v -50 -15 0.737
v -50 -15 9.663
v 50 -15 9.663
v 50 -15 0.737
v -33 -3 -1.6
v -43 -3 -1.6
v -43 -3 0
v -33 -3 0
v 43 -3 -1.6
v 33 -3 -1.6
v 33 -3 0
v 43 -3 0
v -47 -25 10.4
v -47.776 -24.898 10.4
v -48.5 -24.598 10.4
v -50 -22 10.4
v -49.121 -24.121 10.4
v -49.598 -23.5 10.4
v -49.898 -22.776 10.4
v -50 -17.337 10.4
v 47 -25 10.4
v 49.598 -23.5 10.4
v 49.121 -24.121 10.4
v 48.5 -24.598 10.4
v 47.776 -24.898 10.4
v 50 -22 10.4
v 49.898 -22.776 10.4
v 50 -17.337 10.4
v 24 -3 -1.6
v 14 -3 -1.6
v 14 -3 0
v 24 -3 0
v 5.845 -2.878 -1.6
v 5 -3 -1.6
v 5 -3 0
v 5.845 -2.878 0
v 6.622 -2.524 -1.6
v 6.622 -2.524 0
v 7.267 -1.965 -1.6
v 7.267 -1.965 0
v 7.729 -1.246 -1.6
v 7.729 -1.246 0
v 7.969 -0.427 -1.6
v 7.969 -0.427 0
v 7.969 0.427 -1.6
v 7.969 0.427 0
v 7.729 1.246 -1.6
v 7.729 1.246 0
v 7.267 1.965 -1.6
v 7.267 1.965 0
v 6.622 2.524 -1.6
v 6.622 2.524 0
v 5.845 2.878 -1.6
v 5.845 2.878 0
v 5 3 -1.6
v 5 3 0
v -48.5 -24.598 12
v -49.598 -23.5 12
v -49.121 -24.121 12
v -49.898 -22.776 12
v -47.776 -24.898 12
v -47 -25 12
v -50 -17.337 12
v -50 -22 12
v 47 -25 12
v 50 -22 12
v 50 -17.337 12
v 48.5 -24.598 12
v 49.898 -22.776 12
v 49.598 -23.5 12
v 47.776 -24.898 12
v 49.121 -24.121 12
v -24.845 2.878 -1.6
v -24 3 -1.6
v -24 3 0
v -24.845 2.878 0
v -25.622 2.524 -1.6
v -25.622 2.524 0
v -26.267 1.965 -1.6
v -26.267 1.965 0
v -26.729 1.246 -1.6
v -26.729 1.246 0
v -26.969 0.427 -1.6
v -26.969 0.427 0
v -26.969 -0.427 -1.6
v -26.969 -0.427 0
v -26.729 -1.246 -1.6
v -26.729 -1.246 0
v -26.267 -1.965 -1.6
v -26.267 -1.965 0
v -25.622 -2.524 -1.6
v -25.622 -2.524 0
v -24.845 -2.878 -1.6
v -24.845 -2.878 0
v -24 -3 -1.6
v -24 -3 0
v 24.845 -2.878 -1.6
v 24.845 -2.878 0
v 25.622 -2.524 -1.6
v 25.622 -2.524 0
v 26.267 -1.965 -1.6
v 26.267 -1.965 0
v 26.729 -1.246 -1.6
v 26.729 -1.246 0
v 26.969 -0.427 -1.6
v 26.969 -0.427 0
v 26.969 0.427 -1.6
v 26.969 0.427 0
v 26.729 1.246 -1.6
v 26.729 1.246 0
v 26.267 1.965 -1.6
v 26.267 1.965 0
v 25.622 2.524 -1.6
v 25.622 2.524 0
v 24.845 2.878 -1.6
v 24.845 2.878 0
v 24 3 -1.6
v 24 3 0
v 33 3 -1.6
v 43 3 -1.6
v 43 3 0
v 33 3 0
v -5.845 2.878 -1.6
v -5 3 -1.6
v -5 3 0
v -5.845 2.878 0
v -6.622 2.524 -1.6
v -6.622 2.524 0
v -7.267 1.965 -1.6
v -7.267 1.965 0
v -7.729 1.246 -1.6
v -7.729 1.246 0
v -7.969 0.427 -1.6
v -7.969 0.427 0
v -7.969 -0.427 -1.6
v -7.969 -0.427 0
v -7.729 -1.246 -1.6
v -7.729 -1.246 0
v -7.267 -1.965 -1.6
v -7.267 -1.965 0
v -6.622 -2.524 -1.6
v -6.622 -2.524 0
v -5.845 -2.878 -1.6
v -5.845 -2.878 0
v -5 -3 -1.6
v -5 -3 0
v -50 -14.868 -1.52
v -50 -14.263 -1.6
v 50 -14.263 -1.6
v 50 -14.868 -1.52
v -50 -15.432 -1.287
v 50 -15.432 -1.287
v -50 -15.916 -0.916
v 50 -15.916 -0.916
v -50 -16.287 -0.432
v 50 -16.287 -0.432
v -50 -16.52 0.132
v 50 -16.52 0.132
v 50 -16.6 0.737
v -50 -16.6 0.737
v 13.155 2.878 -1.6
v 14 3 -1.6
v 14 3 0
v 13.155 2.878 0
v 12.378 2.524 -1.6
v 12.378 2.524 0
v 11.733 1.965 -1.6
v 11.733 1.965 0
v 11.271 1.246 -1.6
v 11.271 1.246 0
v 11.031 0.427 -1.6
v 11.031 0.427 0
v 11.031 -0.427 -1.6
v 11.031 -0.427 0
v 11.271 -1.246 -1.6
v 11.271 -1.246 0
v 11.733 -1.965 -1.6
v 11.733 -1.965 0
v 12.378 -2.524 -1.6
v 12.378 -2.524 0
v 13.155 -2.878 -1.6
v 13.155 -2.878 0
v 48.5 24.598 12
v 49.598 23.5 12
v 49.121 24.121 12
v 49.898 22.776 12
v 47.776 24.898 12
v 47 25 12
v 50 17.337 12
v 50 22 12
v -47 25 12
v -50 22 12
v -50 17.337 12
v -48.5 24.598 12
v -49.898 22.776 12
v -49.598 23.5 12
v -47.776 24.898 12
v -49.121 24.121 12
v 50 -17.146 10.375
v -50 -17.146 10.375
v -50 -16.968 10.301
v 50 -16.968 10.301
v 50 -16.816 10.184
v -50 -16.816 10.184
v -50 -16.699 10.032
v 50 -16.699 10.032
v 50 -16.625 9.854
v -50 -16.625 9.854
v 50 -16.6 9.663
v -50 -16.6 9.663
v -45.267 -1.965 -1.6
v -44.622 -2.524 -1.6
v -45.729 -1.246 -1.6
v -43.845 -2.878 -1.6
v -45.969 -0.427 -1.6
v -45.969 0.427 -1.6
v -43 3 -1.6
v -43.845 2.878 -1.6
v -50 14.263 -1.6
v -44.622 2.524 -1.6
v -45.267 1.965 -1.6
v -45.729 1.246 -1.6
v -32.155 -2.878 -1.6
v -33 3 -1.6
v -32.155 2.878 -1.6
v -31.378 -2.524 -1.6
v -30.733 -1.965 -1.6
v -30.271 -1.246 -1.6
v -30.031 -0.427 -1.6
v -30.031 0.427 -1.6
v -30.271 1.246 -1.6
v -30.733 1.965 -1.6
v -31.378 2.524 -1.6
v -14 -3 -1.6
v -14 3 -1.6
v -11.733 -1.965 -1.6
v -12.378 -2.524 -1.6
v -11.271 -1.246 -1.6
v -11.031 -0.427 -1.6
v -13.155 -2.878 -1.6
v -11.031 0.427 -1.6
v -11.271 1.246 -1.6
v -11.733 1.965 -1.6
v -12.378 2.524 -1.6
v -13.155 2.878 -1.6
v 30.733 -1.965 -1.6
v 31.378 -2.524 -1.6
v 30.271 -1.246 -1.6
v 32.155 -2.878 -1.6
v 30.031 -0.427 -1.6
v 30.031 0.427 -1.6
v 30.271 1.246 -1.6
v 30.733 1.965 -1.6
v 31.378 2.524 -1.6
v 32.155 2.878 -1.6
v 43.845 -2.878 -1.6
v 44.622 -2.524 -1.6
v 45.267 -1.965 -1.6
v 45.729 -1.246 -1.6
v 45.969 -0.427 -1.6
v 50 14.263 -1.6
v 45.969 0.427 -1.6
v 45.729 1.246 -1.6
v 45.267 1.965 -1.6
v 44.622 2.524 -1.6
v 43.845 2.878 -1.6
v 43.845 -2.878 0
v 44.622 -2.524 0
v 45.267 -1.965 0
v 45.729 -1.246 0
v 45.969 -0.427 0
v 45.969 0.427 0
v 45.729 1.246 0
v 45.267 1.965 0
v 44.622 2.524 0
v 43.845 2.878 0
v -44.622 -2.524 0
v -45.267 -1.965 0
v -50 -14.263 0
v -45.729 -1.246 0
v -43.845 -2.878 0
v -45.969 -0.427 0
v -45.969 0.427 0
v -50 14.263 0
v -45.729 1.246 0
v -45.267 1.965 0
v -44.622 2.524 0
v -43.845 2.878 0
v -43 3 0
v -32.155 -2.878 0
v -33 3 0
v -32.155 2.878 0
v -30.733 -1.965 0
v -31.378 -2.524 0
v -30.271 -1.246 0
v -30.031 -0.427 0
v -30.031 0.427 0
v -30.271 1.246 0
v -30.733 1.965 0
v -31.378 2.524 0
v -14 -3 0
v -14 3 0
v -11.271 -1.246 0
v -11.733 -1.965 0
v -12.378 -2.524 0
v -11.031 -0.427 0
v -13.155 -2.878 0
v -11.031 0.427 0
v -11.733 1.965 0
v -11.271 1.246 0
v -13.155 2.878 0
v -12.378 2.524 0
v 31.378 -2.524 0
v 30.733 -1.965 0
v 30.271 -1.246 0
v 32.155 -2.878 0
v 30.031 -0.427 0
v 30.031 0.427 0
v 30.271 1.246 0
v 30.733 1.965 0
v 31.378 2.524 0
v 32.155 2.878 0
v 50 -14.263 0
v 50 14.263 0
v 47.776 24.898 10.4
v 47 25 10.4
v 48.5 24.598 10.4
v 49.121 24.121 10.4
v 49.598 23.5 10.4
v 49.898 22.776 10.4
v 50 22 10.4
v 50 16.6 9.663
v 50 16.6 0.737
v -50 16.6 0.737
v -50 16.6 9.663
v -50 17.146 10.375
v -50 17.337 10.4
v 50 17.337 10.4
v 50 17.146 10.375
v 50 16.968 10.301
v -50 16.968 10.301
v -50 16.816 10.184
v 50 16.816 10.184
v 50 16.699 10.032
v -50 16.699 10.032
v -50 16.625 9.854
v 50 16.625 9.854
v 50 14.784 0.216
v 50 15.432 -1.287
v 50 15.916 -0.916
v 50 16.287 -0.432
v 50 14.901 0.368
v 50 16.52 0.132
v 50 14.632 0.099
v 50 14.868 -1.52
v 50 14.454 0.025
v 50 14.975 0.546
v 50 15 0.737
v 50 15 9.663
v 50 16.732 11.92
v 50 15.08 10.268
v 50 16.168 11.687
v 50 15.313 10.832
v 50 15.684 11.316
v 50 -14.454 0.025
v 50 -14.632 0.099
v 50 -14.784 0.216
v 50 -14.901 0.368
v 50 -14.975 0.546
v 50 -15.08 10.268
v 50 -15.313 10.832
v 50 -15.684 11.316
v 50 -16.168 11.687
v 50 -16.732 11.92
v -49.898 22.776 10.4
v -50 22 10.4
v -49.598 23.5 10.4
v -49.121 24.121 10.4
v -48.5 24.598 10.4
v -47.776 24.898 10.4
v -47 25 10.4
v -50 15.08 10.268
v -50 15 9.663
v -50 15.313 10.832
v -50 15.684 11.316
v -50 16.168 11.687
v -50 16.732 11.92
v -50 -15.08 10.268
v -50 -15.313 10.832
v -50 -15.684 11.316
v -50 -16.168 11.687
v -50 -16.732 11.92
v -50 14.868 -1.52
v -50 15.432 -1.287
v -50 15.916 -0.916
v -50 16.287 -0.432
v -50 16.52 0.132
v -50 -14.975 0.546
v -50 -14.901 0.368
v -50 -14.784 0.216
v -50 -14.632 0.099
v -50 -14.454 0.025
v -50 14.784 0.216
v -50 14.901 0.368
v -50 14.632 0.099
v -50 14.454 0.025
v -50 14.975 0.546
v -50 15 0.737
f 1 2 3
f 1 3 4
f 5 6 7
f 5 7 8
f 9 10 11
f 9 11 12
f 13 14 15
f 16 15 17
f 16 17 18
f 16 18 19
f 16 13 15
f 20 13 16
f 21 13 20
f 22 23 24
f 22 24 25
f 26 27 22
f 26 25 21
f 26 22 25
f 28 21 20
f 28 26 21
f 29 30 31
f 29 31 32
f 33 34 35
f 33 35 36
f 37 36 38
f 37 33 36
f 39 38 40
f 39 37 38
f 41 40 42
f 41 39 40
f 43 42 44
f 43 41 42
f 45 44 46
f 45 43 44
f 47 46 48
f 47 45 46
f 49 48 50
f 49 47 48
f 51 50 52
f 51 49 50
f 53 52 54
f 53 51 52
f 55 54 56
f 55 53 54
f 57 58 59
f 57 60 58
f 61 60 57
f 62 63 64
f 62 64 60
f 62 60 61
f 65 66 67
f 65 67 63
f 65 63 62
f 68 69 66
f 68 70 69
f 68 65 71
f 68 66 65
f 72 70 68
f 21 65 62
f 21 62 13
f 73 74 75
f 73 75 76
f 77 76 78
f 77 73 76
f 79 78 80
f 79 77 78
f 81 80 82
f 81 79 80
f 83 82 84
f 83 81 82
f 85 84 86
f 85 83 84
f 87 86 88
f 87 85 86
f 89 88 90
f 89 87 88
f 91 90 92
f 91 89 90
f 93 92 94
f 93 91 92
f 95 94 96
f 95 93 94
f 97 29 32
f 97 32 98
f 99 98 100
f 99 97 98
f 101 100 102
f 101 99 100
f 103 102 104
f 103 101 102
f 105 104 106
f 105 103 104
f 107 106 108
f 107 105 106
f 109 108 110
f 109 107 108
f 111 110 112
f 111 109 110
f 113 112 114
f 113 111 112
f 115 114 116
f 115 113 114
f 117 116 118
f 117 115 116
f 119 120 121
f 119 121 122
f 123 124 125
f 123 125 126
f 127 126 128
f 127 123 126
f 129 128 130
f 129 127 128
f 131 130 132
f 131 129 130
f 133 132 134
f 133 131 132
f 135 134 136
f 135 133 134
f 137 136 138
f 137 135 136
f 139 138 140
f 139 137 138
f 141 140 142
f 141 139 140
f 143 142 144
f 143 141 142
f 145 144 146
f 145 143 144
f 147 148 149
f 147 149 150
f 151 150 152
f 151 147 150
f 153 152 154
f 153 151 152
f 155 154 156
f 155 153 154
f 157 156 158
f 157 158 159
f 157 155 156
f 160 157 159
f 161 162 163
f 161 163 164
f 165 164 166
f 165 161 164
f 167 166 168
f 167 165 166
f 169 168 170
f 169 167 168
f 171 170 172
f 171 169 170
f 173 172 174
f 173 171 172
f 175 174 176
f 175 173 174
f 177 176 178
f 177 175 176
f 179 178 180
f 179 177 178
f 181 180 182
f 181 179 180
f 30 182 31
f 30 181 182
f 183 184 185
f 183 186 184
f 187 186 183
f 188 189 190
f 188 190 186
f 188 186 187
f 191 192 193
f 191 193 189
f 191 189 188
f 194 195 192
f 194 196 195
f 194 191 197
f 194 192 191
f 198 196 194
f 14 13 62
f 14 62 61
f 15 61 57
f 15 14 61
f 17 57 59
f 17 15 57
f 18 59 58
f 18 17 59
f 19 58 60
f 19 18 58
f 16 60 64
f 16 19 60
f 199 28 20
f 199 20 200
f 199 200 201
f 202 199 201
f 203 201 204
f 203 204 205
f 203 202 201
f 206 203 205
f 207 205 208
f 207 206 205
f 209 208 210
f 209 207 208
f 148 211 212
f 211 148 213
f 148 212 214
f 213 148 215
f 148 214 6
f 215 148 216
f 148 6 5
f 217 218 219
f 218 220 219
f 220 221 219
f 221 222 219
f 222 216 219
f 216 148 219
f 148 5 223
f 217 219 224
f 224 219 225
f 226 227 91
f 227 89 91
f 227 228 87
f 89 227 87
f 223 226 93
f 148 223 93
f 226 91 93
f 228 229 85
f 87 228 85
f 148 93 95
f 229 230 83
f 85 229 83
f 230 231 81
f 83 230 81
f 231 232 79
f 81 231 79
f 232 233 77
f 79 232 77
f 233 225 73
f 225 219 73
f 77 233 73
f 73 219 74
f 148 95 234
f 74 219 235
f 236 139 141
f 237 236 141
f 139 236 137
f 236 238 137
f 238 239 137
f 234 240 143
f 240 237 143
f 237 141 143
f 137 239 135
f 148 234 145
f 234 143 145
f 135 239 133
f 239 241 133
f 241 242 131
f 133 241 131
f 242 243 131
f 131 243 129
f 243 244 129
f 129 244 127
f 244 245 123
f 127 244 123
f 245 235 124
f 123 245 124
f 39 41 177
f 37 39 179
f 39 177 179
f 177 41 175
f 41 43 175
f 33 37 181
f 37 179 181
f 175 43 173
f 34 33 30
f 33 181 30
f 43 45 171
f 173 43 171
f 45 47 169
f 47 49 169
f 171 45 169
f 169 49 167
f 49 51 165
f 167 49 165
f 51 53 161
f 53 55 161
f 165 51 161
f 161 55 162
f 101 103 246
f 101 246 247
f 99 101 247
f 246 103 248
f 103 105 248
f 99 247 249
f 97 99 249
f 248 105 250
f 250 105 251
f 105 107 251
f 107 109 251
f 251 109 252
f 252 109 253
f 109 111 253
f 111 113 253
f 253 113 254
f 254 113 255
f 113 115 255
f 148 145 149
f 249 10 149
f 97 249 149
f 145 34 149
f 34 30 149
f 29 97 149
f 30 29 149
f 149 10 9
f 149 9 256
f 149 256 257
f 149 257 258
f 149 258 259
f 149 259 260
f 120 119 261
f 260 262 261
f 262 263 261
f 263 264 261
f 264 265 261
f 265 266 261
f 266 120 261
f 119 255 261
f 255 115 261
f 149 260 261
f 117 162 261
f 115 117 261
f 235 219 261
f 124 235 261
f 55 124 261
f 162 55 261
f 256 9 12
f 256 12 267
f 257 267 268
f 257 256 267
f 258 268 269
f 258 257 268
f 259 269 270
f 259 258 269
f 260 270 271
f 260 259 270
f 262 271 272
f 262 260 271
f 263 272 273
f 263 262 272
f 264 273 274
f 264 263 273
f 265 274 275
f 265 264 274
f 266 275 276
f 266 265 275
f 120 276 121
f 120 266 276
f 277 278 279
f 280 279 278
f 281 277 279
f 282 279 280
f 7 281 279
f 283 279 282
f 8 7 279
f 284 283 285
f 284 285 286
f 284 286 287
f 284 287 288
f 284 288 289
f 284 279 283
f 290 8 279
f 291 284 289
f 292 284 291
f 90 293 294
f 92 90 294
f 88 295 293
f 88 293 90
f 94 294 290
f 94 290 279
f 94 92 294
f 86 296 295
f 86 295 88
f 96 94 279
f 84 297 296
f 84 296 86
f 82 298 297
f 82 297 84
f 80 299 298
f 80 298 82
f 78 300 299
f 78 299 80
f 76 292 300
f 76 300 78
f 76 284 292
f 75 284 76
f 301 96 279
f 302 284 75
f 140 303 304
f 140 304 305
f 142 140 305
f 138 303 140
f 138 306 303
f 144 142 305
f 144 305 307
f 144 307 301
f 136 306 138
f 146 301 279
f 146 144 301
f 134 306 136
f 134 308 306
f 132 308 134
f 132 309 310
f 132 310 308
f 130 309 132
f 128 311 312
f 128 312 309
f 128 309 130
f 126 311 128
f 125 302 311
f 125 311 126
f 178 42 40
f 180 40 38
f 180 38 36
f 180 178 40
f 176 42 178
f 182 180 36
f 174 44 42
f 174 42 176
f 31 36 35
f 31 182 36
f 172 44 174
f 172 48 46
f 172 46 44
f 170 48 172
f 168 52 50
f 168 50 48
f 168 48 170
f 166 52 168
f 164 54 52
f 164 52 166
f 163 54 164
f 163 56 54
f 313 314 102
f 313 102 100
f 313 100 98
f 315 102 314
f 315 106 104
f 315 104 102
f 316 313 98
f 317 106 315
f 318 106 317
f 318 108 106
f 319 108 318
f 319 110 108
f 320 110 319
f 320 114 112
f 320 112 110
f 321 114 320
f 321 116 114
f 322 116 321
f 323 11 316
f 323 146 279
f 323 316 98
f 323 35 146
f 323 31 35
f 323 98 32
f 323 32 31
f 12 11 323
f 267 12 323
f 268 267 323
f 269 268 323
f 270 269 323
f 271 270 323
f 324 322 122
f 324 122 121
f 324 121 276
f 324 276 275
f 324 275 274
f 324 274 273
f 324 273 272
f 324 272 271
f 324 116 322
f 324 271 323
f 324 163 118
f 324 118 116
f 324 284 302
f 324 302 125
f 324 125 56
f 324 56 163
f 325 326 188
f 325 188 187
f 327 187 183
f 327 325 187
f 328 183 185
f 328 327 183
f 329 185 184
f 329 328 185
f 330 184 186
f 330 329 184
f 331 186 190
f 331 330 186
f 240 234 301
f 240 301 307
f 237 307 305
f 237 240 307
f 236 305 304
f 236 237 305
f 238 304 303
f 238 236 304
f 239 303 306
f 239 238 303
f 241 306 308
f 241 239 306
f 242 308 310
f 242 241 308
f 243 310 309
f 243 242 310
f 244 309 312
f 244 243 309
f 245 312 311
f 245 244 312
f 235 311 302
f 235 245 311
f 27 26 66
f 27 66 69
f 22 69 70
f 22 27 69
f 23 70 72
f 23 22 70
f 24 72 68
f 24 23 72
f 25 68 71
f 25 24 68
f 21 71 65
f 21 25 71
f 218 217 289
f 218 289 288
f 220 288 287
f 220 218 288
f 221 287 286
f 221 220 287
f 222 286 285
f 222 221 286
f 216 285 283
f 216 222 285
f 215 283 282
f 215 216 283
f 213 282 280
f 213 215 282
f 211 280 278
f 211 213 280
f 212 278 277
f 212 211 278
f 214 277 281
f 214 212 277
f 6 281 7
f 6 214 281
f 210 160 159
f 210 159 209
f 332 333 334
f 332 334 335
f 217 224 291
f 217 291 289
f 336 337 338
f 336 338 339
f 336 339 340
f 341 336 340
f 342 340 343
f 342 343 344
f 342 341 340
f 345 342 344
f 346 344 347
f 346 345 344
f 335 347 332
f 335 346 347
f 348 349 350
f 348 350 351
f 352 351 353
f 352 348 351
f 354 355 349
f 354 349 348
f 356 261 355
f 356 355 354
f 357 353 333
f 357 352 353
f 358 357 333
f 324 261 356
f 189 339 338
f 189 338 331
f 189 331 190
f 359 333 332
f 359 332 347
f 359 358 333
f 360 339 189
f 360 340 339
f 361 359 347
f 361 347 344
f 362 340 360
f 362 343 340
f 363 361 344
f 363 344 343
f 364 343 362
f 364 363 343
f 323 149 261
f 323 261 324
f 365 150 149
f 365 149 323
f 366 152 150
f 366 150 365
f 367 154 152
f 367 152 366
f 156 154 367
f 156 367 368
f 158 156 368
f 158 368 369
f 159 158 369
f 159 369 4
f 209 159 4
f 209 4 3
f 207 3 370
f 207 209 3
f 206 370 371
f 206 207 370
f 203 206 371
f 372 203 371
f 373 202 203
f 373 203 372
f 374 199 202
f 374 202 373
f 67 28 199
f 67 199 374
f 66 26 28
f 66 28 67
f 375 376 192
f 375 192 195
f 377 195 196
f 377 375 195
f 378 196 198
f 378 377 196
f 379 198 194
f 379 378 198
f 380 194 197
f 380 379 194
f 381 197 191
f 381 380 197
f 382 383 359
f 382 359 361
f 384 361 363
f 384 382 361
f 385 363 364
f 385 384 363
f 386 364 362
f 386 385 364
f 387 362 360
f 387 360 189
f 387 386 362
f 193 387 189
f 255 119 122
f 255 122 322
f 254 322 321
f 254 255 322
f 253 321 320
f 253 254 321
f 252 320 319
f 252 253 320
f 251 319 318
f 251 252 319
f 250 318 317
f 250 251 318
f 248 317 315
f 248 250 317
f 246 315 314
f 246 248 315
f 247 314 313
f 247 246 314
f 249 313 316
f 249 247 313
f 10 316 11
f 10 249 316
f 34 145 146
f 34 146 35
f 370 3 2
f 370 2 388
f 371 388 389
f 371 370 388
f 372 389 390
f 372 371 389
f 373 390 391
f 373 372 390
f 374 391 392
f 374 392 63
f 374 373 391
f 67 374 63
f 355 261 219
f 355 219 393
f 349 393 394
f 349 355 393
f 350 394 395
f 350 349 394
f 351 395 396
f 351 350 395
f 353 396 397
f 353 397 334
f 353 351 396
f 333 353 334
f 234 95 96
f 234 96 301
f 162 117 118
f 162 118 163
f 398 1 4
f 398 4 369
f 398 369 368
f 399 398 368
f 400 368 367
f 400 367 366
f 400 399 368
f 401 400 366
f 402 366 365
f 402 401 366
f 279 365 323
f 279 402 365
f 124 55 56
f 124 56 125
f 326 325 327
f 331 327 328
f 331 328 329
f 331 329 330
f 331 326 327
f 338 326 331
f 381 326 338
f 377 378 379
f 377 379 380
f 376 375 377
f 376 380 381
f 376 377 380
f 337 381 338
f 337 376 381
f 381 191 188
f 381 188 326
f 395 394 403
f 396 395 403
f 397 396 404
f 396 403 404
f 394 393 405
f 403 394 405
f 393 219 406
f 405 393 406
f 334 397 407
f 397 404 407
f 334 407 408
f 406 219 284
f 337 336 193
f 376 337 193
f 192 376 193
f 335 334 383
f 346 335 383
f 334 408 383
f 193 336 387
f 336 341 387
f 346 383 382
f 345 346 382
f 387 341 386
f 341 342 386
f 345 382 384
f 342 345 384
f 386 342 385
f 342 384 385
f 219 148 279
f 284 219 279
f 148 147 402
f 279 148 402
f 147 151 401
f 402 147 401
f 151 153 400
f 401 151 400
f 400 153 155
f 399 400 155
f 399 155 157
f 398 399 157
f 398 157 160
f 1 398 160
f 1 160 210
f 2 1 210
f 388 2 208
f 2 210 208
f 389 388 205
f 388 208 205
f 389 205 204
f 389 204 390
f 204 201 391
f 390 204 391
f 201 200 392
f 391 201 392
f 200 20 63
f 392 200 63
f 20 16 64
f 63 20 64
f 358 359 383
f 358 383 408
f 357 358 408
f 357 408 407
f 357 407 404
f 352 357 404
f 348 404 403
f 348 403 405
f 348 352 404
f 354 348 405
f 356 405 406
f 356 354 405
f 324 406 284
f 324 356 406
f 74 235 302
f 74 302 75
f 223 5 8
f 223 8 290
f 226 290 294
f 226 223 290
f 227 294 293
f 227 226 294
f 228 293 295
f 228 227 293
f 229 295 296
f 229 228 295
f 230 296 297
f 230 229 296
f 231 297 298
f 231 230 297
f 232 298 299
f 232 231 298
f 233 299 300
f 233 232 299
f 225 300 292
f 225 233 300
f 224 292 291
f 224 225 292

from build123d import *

# Parameters (mm, degrees)
SKETCH_1_W                         = 100
SKETCH_1_H                         = 30
SM_BASE_FLANGE_1_DEPTH             = 1.6
SM_EDGE_FLANGE_1_STRIP_W           = 7.8732
SM_EDGE_FLANGE_1_STRIP_H           = 1.6
SM_EDGE_FLANGE_1_STRIP_CUT_DEPTH   = 100
SM_EDGE_FLANGE_1_STRIP_2_W         = 7.8732
SM_EDGE_FLANGE_1_STRIP_2_H         = 1.6
SM_EDGE_FLANGE_1_STRIP_CUT_2_DEPTH = 100
SM_EDGE_FLANGE_1_DEPTH             = 100
SM_EDGE_FLANGE_1_BEND_DEPTH        = 100
SM_EDGE_FLANGE_2_STRIP_W           = 7.8732
SM_EDGE_FLANGE_2_STRIP_H           = 1.6
SM_EDGE_FLANGE_2_STRIP_CUT_DEPTH   = 100
SM_EDGE_FLANGE_2_STRIP_2_W         = 7.8732
SM_EDGE_FLANGE_2_STRIP_2_H         = 1.6
SM_EDGE_FLANGE_2_STRIP_CUT_2_DEPTH = 100
SM_EDGE_FLANGE_2_DEPTH             = 100
SM_EDGE_FLANGE_2_BEND_DEPTH        = 100
CUT_EXTRUDE_1_DEPTH                = 58.175169436
CUT_EXTRUDE_2_DEPTH                = 58.532251825


# Sheet-metal steps are written as plain solids
with BuildPart() as part:
    # Sketch 1 → 基体-法兰1 (new body)
    with BuildSketch(Plane.XY):
        Rectangle(SKETCH_1_W, SKETCH_1_H)
    extrude(amount=-SM_BASE_FLANGE_1_DEPTH)

    # 边线-法兰1 strip (across the edge) → 边线-法兰1 strip cut (cut)
    with BuildSketch(Plane(origin=(50, 15, 0), x_dir=(0, -1, 0), z_dir=(-1, 0, 0))):
        with Locations((-3.2, -0.8)):
            Rectangle(SM_EDGE_FLANGE_1_STRIP_W, SM_EDGE_FLANGE_1_STRIP_H)
    extrude(amount=SM_EDGE_FLANGE_1_STRIP_CUT_DEPTH, mode=Mode.SUBTRACT)

    # 边线-法兰1 strip 2 (across the edge) → 边线-法兰1 strip cut 2 (cut)
    with BuildSketch(Plane(origin=(-50, -15, 0), x_dir=(0, 1, 0), z_dir=(1, 0, 0))):
        with Locations((-3.2, -0.8)):
            Rectangle(SM_EDGE_FLANGE_1_STRIP_2_W, SM_EDGE_FLANGE_1_STRIP_2_H)
    extrude(amount=SM_EDGE_FLANGE_1_STRIP_CUT_2_DEPTH, mode=Mode.SUBTRACT)

    # 边线-法兰1 section (across the edge) → 边线-法兰1 (add)
    with BuildSketch(Plane(origin=(50, 15, 0), x_dir=(0, -1, 0), z_dir=(-1, 0, 0))):
        with BuildLine():
            Line((-1.6, 0.7366), (-1.6, 10.4))
            Line((-1.6, 10.4), (0, 10.4))
            Line((0, 10.4), (0, 0.7366))
            ThreePointArc((0, 0.7366), (0.215745145, 0.215745145), (0.7366, 0))
            Line((0.7366, 0), (0.7366, -1.6))
            ThreePointArc((0.7366, -1.6), (-0.915625705, -0.915625705), (-1.6, 0.7366))
        make_face()
    extrude(amount=SM_EDGE_FLANGE_1_DEPTH)

    # 边线-法兰1 section 2 (across the edge) → 边线-法兰1 bend (add)
    with BuildSketch(Plane(origin=(-50, -15, 0), x_dir=(0, 1, 0), z_dir=(1, 0, 0))):
        with BuildLine():
            Line((-1.6, 0.7366), (-1.6, 10.4))
            Line((-1.6, 10.4), (0, 10.4))
            Line((0, 10.4), (0, 0.7366))
            ThreePointArc((0, 0.7366), (0.215745145, 0.215745145), (0.7366, 0))
            Line((0.7366, 0), (0.7366, -1.6))
            ThreePointArc((0.7366, -1.6), (-0.915625705, -0.915625705), (-1.6, 0.7366))
        make_face()
    extrude(amount=SM_EDGE_FLANGE_1_BEND_DEPTH)

    # 边线-法兰2 strip (across the edge) → 边线-法兰2 strip cut (cut)
    with BuildSketch(Plane(origin=(-50, 16.6, 10.4), x_dir=(0, 0, -1), z_dir=(1, 0, 0))):
        with Locations((-3.2, -0.8)):
            Rectangle(SM_EDGE_FLANGE_2_STRIP_W, SM_EDGE_FLANGE_2_STRIP_H)
    extrude(amount=SM_EDGE_FLANGE_2_STRIP_CUT_DEPTH, mode=Mode.SUBTRACT)

    # 边线-法兰2 strip 2 (across the edge) → 边线-法兰2 strip cut 2 (cut)
    with BuildSketch(Plane(origin=(50, -16.6, 10.4), x_dir=(0, 0, -1), z_dir=(-1, 0, 0))):
        with Locations((-3.2, -0.8)):
            Rectangle(SM_EDGE_FLANGE_2_STRIP_2_W, SM_EDGE_FLANGE_2_STRIP_2_H)
    extrude(amount=SM_EDGE_FLANGE_2_STRIP_CUT_2_DEPTH, mode=Mode.SUBTRACT)

    # 边线-法兰2 section (across the edge) → 边线-法兰2 (add)
    with BuildSketch(Plane(origin=(-50, 16.6, 10.4), x_dir=(0, 0, -1), z_dir=(1, 0, 0))):
        with BuildLine():
            Line((-1.6, 0.7366), (-1.6, 8.4))
            Line((-1.6, 8.4), (0, 8.4))
            Line((0, 8.4), (0, 0.7366))
            ThreePointArc((0, 0.7366), (0.215745145, 0.215745145), (0.7366, 0))
            Line((0.7366, 0), (0.7366, -1.6))
            ThreePointArc((0.7366, -1.6), (-0.915625705, -0.915625705), (-1.6, 0.7366))
        make_face()
    extrude(amount=SM_EDGE_FLANGE_2_DEPTH)

    # 边线-法兰2 section 2 (across the edge) → 边线-法兰2 bend (add)
    with BuildSketch(Plane(origin=(50, -16.6, 10.4), x_dir=(0, 0, -1), z_dir=(-1, 0, 0))):
        with BuildLine():
            Line((-1.6, 0.7366), (-1.6, 8.4))
            Line((-1.6, 8.4), (0, 8.4))
            Line((0, 8.4), (0, 0.7366))
            ThreePointArc((0, 0.7366), (0.215745145, 0.215745145), (0.7366, 0))
            Line((0.7366, 0), (0.7366, -1.6))
            ThreePointArc((0.7366, -1.6), (-0.915625705, -0.915625705), (-1.6, 0.7366))
        make_face()
    extrude(amount=SM_EDGE_FLANGE_2_BEND_DEPTH)

    # 草图18 → 切除-拉伸1 (cut, through all)
    with BuildSketch(Plane.XY):
        with BuildLine():
            Line((50, 25), (47, 25))
            ThreePointArc((47, 25), (49.121320344, 24.121320344), (50, 22))
            Line((50, 22), (50, 25))
        make_face()
        with BuildLine():
            Line((-47, 25), (-50, 25))
            Line((-50, 25), (-50, 22))
            ThreePointArc((-50, 22), (-49.121320344, 24.121320344), (-47, 25))
        make_face()
        with BuildLine():
            Line((-50, -22), (-50, -25))
            Line((-50, -25), (-47, -25))
            ThreePointArc((-47, -25), (-49.121320344, -24.121320344), (-50, -22))
        make_face()
        with BuildLine():
            Line((47, -25), (50, -25))
            Line((50, -25), (50, -22))
            ThreePointArc((50, -22), (49.121320344, -24.121320344), (47, -25))
        make_face()
    extrude(amount=CUT_EXTRUDE_1_DEPTH, mode=Mode.SUBTRACT)

    # 草图19 → 切除-拉伸2 (cut, through all)
    with BuildSketch(Plane(origin=(0, 0, -1.6), x_dir=(-1, 0, 0), z_dir=(0, 0, -1))):
        with BuildLine():
            Line((-43, 3), (-33, 3))
            ThreePointArc((-33, 3), (-30, 0), (-33, -3))
            Line((-33, -3), (-43, -3))
            ThreePointArc((-43, -3), (-46, 0), (-43, 3))
        make_face()
        with BuildLine():
            Line((-24, 3), (-14, 3))
            ThreePointArc((-14, 3), (-11, 0), (-14, -3))
            Line((-14, -3), (-24, -3))
            ThreePointArc((-24, -3), (-27, 0), (-24, 3))
        make_face()
        with BuildLine():
            Line((-5, 3), (5, 3))
            ThreePointArc((5, 3), (8, 0), (5, -3))
            Line((5, -3), (-5, -3))
            ThreePointArc((-5, -3), (-8, 0), (-5, 3))
        make_face()
        with BuildLine():
            Line((14, 3), (24, 3))
            ThreePointArc((24, 3), (27, 0), (24, -3))
            Line((24, -3), (14, -3))
            ThreePointArc((14, -3), (11, 0), (14, 3))
        make_face()
        with BuildLine():
            Line((33, 3), (43, 3))
            ThreePointArc((43, 3), (46, 0), (43, -3))
            Line((43, -3), (33, -3))
            ThreePointArc((33, -3), (30, 0), (33, 3))
        make_face()
    extrude(amount=-CUT_EXTRUDE_2_DEPTH, mode=Mode.SUBTRACT)


solid = part.part
